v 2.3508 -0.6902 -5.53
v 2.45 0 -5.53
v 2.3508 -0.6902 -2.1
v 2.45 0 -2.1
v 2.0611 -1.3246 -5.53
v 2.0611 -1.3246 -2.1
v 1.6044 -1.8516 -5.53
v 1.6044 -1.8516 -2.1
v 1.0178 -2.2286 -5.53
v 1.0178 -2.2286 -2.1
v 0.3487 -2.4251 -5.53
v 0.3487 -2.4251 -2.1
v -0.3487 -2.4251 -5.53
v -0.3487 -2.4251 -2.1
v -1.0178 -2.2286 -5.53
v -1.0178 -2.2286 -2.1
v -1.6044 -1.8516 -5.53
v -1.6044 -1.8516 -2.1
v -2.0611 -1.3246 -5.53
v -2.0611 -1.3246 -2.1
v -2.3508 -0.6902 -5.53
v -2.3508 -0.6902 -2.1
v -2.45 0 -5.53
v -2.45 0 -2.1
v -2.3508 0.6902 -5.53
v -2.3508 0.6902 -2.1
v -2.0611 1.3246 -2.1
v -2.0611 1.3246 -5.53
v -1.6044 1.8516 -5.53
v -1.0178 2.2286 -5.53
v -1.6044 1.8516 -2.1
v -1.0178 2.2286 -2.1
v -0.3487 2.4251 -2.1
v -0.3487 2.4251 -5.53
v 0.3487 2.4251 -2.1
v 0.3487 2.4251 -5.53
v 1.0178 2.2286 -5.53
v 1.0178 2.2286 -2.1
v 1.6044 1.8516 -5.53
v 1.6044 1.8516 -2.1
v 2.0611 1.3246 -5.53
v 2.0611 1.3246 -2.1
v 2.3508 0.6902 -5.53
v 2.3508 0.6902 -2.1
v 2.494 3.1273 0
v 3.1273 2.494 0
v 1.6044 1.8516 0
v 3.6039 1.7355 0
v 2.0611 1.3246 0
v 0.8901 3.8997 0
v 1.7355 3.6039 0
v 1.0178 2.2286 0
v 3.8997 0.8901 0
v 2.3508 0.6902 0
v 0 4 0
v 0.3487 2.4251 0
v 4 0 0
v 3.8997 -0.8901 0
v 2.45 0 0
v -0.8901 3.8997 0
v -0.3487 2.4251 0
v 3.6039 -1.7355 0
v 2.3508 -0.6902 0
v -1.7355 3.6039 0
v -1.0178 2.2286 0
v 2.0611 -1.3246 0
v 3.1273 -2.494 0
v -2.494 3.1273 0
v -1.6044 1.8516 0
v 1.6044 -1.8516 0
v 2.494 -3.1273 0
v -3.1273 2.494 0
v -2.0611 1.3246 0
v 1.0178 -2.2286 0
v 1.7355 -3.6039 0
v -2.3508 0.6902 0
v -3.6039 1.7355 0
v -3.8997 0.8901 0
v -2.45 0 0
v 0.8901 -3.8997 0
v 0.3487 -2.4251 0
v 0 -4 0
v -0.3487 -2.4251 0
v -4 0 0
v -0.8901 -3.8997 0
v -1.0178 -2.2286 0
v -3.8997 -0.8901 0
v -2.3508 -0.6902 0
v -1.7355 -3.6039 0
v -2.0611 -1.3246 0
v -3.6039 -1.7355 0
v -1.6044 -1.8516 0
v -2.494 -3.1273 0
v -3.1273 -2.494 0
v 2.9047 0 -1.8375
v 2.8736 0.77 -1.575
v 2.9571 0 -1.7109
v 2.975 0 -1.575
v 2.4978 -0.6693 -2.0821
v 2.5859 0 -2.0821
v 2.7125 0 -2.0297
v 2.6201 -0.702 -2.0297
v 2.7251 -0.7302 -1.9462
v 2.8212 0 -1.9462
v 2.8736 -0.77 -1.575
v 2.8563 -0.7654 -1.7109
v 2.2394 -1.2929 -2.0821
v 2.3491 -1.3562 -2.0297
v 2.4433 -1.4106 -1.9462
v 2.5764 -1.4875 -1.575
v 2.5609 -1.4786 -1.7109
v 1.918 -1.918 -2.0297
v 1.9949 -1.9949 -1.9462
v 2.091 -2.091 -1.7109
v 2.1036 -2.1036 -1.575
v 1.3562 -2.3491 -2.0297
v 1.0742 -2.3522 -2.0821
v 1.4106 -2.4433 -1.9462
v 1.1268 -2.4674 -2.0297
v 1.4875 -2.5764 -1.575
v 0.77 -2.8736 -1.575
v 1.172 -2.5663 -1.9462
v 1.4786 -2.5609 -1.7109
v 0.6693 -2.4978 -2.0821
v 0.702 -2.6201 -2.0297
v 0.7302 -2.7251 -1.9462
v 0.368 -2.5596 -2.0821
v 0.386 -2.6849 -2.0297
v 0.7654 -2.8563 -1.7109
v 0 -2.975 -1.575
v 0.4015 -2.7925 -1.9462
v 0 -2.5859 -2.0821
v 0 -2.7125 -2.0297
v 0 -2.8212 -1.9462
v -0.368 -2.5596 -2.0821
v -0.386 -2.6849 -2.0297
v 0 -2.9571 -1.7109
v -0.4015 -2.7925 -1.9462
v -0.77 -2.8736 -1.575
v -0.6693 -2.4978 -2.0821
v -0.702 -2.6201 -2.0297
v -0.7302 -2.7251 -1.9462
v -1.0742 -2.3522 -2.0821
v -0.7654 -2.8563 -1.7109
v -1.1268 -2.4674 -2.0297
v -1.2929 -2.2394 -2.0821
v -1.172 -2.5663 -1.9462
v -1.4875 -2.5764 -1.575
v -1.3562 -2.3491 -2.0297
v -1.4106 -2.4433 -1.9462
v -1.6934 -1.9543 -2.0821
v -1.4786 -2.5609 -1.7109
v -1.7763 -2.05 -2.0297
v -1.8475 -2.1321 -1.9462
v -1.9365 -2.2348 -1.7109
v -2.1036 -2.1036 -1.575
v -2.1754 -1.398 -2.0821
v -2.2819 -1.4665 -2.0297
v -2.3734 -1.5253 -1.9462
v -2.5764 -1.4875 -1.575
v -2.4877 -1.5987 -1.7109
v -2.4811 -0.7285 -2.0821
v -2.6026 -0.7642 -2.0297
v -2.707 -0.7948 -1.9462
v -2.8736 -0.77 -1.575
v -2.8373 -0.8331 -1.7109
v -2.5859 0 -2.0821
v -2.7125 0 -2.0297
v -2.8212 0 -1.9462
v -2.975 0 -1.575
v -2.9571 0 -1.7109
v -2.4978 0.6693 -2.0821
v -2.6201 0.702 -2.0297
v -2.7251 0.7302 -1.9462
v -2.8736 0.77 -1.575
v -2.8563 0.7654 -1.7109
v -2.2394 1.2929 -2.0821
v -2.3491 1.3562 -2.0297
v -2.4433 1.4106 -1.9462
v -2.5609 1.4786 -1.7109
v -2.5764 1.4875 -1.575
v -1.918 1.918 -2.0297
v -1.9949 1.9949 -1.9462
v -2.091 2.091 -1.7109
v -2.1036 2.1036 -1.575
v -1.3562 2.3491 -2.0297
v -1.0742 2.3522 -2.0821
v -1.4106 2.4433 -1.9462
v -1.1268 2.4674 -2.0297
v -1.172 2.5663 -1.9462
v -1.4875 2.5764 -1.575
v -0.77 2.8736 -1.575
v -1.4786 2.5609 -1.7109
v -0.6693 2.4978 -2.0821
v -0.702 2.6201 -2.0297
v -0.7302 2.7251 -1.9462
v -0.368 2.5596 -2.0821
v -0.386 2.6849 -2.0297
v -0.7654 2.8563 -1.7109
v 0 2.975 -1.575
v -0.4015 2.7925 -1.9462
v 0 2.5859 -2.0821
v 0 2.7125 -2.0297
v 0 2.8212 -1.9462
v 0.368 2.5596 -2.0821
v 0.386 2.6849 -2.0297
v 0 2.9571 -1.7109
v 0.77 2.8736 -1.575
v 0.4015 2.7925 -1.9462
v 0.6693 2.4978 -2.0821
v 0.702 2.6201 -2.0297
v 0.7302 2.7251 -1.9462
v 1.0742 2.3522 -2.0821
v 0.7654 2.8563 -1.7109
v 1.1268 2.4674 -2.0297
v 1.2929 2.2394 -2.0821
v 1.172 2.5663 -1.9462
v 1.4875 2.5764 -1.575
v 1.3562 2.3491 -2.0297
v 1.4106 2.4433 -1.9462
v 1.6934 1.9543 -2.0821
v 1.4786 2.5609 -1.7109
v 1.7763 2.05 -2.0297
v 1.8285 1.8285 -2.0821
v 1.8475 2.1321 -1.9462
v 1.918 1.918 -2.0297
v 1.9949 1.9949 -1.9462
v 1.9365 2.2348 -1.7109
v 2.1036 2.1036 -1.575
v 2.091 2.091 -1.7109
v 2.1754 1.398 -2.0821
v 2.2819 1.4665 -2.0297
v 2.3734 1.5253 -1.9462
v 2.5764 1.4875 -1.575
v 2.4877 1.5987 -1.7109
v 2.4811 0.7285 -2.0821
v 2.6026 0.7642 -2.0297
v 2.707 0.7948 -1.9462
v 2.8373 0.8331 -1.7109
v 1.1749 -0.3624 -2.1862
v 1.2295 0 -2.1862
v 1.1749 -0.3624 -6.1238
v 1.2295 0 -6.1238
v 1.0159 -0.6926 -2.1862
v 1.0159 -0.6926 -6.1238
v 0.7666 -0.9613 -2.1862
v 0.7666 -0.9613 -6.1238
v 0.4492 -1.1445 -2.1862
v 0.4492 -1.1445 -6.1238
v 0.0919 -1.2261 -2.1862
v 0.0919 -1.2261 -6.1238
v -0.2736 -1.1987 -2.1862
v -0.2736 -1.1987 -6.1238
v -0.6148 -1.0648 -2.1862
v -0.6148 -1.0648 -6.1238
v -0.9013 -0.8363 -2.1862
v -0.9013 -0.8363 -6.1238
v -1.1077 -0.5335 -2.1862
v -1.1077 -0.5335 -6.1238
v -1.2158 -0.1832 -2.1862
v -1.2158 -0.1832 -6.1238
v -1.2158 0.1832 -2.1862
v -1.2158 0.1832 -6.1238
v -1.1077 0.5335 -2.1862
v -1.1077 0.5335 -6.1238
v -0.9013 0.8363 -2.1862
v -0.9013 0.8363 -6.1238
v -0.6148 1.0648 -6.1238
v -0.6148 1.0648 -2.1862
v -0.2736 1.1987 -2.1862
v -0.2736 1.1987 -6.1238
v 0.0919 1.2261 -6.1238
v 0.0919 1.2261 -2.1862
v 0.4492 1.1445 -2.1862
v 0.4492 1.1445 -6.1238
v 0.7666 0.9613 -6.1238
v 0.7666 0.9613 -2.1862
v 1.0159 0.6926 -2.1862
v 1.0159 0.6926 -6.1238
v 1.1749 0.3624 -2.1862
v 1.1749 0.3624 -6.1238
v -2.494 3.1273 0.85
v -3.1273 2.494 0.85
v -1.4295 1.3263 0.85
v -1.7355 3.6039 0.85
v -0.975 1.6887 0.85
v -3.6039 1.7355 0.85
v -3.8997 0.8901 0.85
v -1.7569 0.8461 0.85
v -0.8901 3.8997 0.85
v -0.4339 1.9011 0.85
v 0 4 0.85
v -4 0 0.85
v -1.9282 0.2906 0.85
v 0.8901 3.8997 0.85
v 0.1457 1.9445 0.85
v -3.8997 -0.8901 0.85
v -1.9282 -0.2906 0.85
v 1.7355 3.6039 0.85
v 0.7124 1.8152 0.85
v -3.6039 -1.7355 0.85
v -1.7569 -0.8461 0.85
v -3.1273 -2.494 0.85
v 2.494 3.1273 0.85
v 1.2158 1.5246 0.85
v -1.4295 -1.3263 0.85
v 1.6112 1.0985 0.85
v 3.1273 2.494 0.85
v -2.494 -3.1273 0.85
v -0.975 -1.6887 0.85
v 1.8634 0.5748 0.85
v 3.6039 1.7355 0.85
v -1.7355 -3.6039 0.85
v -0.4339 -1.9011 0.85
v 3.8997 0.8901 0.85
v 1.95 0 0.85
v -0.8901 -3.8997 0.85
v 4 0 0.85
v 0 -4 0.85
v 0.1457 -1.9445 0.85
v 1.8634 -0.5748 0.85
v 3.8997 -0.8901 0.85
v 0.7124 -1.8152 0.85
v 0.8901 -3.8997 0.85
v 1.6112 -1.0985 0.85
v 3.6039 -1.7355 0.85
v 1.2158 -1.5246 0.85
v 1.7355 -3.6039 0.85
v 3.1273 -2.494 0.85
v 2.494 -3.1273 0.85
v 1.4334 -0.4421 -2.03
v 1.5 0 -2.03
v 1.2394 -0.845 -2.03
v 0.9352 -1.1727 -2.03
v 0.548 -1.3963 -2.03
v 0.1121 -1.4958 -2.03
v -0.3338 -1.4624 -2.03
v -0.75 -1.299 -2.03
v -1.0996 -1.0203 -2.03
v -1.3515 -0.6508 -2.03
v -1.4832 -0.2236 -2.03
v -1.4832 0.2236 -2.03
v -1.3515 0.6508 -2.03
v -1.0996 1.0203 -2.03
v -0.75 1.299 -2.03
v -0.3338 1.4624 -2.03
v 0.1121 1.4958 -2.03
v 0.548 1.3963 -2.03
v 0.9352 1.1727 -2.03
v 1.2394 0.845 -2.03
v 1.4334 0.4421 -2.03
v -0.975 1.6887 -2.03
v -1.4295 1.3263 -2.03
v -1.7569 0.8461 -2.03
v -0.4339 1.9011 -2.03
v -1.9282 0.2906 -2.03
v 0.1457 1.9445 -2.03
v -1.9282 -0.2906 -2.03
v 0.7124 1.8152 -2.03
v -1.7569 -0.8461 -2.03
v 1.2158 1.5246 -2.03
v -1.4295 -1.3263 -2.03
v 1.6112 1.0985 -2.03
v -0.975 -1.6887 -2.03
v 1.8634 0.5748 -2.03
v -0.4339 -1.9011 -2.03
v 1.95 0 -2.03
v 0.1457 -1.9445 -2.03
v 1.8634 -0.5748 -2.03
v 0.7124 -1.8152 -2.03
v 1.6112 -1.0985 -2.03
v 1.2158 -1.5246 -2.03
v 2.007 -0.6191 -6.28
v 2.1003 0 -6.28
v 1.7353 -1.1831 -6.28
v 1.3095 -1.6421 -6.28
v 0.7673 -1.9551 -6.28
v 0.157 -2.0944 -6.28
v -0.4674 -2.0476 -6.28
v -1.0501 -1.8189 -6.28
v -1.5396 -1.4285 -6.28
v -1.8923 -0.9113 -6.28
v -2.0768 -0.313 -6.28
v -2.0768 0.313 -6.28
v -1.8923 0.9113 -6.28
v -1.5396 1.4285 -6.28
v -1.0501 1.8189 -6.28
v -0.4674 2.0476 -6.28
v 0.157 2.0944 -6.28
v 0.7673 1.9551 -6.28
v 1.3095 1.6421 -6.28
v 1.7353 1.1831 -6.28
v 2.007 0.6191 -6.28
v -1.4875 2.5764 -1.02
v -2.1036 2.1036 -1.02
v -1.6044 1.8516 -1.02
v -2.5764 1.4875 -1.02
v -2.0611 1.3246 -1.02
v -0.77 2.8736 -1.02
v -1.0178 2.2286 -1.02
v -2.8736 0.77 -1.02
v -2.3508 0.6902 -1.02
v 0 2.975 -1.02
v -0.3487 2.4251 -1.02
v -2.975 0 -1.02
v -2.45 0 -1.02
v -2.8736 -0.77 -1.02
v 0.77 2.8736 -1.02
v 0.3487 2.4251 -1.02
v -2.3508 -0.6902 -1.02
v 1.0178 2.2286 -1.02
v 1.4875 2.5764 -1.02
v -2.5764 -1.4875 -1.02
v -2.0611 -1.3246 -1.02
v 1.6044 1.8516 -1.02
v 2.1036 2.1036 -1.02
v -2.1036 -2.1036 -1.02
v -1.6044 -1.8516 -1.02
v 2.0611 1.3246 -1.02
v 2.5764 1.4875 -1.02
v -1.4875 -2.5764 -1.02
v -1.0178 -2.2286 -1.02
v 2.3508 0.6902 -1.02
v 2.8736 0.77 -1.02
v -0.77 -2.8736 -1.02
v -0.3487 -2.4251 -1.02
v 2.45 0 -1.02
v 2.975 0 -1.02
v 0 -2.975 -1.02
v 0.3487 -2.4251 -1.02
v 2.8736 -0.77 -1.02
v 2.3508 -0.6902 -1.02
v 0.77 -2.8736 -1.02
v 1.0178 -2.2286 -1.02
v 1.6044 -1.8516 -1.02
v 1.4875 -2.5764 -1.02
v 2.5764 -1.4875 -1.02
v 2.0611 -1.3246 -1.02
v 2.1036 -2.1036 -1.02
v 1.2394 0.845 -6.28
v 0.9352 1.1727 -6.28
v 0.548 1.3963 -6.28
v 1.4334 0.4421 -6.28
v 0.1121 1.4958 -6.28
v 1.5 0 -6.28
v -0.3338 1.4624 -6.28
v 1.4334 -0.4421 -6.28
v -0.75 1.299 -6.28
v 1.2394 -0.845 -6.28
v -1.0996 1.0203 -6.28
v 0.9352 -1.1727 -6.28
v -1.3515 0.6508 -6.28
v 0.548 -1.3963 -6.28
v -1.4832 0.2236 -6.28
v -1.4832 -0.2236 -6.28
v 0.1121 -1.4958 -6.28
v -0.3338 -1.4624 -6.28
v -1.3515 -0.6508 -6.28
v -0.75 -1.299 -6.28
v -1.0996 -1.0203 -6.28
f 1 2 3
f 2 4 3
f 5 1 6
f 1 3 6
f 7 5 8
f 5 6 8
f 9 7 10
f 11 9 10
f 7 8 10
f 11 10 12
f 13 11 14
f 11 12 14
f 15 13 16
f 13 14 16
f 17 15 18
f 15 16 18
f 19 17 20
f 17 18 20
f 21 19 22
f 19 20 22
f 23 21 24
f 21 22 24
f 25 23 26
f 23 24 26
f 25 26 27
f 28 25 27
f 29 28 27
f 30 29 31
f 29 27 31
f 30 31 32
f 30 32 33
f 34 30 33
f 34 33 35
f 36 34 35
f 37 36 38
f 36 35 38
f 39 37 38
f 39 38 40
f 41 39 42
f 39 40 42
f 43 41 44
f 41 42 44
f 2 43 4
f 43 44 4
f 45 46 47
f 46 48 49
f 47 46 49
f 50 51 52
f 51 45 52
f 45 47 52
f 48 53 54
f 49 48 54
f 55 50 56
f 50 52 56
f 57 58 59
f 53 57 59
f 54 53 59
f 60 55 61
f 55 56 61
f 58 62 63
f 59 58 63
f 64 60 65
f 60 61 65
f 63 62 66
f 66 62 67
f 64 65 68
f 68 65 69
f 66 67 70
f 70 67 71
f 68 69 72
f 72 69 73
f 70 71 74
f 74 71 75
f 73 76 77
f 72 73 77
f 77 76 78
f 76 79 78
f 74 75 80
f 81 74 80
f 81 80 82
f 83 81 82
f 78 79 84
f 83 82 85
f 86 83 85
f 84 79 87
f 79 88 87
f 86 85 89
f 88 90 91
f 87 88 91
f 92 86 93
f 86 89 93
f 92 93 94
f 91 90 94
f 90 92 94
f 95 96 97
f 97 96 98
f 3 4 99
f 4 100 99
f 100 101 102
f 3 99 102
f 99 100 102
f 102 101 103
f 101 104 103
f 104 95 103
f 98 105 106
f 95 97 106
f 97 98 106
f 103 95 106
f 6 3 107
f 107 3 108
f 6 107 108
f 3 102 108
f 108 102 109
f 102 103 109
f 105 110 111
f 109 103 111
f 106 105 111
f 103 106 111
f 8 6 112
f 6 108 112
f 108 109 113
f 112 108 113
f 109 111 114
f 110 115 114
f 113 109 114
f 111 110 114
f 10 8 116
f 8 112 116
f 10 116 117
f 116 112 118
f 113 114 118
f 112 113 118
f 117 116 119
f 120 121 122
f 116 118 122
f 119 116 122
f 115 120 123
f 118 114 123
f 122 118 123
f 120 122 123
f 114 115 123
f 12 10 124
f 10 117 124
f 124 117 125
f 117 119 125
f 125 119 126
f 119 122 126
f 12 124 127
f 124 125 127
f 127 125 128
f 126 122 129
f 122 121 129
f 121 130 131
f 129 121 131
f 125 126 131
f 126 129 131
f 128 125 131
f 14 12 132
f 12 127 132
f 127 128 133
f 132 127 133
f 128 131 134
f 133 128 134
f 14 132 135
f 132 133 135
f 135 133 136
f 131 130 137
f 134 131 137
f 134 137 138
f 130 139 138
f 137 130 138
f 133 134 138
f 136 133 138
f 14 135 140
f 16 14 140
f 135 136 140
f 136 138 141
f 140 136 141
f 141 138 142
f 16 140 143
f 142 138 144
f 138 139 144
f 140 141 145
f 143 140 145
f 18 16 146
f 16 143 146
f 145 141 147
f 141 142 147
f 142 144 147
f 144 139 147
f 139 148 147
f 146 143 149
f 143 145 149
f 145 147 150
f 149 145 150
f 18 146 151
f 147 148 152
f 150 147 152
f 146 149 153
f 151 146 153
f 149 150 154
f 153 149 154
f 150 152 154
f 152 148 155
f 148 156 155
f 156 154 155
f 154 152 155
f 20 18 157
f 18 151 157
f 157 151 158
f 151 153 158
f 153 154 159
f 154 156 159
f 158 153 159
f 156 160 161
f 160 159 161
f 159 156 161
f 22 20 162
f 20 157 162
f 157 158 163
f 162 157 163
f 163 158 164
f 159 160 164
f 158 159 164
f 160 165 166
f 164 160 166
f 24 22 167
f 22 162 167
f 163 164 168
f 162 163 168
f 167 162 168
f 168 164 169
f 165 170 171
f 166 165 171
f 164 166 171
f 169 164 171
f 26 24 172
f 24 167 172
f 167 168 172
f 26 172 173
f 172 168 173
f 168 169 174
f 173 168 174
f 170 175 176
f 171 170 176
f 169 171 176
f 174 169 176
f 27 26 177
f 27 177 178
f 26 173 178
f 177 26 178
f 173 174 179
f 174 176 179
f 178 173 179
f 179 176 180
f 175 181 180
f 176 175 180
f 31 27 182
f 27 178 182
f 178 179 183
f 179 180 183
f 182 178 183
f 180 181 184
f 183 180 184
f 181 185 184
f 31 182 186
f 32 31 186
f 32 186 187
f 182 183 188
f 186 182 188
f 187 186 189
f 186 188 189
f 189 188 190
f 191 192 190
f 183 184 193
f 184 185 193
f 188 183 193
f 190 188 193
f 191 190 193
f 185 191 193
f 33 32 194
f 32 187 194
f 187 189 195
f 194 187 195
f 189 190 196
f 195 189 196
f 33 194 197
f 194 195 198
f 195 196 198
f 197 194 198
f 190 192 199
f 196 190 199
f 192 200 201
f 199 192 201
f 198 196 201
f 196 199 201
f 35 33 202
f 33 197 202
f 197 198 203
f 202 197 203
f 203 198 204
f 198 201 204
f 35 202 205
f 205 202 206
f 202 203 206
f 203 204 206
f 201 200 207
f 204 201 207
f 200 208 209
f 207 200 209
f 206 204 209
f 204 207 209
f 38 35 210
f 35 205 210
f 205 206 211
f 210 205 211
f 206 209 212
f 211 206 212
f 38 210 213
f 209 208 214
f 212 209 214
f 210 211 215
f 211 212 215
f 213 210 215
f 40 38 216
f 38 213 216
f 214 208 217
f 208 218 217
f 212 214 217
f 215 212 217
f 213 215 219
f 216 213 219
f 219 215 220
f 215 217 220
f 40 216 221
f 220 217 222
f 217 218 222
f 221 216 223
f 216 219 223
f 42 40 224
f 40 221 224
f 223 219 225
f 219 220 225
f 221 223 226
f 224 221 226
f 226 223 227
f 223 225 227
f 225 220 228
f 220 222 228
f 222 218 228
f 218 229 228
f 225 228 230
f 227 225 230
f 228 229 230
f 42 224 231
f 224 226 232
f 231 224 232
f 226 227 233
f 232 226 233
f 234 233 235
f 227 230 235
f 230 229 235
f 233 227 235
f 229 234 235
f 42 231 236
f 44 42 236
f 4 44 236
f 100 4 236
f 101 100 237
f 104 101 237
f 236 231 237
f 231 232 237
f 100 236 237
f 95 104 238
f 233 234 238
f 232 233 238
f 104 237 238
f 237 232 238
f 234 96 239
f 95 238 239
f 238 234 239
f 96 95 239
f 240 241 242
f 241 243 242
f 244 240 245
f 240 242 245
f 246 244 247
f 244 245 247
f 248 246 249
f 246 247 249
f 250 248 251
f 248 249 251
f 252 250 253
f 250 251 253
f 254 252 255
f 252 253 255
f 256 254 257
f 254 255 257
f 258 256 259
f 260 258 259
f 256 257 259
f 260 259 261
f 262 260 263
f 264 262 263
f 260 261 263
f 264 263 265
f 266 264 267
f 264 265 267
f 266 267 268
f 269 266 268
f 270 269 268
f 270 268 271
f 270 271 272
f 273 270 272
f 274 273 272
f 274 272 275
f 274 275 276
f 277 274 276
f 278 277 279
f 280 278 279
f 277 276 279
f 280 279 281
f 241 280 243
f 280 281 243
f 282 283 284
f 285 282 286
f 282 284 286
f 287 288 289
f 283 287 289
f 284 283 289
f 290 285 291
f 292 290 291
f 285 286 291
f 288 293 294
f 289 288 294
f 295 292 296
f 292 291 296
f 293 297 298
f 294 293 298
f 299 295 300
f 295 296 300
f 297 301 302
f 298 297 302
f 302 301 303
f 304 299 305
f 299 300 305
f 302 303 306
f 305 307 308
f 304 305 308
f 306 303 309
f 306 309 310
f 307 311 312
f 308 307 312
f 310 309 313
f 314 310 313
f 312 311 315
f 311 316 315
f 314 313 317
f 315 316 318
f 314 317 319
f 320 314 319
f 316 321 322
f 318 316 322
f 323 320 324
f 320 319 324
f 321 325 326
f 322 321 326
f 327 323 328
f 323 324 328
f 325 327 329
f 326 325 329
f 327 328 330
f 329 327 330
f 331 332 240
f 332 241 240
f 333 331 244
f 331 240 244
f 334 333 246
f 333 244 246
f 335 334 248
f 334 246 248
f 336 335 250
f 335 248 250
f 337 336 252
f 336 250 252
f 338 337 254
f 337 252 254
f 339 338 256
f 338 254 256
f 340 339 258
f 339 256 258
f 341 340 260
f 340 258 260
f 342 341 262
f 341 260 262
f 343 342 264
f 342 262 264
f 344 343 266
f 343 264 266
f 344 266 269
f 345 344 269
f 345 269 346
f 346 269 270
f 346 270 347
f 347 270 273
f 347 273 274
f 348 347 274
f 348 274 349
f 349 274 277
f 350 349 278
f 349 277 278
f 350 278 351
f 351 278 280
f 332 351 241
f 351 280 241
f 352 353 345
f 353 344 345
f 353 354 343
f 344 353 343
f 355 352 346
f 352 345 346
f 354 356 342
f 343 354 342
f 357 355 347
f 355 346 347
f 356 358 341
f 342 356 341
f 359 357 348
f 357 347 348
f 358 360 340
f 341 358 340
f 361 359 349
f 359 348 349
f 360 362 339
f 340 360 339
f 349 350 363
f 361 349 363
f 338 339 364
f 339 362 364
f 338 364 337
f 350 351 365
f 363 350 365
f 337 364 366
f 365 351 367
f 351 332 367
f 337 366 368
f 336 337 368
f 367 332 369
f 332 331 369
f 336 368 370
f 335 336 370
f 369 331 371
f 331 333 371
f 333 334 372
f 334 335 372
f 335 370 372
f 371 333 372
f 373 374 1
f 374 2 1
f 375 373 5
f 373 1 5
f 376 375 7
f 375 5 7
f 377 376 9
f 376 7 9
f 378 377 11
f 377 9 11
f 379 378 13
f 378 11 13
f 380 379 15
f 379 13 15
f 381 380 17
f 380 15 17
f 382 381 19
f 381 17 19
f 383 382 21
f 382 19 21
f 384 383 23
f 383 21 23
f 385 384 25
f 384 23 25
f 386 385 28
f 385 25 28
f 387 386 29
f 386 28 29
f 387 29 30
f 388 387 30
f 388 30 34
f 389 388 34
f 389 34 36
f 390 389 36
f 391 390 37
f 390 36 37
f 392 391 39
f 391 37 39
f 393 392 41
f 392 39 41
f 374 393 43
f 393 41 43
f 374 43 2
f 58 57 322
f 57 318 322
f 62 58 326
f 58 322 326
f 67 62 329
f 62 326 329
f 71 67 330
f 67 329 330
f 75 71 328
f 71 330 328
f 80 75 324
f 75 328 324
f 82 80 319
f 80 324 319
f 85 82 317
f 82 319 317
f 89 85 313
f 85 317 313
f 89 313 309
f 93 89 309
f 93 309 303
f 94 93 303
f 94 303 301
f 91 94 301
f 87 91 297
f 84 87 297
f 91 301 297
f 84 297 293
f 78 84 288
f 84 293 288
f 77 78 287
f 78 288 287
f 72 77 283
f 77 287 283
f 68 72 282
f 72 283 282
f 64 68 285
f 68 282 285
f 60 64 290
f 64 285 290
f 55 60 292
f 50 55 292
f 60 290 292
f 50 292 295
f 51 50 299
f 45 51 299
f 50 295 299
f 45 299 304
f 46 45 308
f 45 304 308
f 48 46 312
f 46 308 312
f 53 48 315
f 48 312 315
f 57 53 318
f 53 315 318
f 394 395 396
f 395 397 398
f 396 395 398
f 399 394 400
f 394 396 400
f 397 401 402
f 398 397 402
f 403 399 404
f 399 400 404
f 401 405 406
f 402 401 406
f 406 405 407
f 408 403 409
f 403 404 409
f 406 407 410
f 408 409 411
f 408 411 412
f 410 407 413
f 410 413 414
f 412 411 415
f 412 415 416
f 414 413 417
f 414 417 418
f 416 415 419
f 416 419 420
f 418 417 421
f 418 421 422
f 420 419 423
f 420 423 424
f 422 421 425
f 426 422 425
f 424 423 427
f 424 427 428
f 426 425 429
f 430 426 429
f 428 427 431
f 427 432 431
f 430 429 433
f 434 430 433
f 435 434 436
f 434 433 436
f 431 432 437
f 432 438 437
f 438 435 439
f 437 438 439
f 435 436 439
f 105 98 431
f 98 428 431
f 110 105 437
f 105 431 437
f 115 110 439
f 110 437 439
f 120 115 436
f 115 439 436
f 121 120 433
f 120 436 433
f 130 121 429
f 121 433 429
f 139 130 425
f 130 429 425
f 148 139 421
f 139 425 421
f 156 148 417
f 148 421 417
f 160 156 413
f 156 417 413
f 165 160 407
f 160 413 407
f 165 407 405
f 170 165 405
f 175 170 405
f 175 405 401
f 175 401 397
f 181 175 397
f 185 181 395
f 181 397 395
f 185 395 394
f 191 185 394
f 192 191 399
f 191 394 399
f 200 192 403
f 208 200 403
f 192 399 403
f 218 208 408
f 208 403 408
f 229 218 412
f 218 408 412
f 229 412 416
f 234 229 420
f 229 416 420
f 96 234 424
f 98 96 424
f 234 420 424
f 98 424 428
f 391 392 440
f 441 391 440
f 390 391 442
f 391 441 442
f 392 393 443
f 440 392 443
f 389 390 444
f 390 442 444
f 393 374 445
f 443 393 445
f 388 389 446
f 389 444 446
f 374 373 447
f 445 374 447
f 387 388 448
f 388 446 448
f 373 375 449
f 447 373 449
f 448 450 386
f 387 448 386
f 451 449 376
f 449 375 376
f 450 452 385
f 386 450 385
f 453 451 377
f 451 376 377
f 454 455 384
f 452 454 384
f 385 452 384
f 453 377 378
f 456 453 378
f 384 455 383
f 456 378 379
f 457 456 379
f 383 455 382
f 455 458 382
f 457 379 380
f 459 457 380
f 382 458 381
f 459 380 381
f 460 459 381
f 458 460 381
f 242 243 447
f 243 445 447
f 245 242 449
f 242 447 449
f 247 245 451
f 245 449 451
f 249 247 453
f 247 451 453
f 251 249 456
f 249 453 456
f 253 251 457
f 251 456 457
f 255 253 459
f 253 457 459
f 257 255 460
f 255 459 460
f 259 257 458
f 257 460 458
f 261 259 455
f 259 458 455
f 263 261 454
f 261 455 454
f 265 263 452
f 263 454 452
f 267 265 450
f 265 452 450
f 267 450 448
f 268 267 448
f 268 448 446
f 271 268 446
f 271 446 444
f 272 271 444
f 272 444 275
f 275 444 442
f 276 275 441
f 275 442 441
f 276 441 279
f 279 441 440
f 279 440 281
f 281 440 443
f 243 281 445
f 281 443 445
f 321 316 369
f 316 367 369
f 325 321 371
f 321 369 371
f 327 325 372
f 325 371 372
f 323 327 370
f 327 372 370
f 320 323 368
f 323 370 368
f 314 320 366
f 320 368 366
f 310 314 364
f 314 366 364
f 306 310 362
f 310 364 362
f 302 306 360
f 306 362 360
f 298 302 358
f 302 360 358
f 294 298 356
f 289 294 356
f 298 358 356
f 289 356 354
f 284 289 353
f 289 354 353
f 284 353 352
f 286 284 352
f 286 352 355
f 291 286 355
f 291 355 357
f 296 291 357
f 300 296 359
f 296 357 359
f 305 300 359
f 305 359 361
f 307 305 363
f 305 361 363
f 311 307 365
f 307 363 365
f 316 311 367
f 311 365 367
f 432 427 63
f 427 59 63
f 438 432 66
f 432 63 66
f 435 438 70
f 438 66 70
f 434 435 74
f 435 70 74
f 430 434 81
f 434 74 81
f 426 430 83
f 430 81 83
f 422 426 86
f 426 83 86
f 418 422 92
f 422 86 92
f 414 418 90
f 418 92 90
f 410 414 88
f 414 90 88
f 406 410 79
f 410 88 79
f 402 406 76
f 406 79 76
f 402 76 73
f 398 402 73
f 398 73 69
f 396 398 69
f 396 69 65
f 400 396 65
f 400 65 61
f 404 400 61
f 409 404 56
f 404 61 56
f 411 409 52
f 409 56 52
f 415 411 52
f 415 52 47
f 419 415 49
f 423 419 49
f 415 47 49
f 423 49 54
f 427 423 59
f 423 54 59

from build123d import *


with BuildPart() as part:
    # Sketch1 → Revolve1 (revolve)
    with BuildSketch(Plane(origin=(0, 0, 0), x_dir=(0, 0, -1), z_dir=(1, 0, 0)), mode=Mode.PRIVATE) as revolve1_sk:
        with BuildLine():
            Line((-0.85, 1.95), (2.03, 1.95))
            Line((2.03, 1.95), (2.03, 1.5))
            Line((2.03, 1.5), (2.186173248, 1.2295))
            Line((2.186173248, 1.2295), (6.123826752, 1.2295))
            Line((6.123826752, 1.2295), (6.28, 1.5))
            Line((6.28, 1.5), (6.28, 2.100269256))
            Line((6.28, 2.100269256), (5.53, 2.45))
            Line((5.53, 2.45), (2.1, 2.45))
            ThreePointArc((2.1, 2.45), (1.94623106, 2.82123106), (1.575, 2.975))
            Line((1.575, 2.975), (1.02, 2.975))
            Line((1.02, 2.975), (1.02, 2.45))
            Line((1.02, 2.45), (0, 2.45))
            Line((0, 2.45), (0, 4))
            Line((0, 4), (-0.85, 4))
            Line((-0.85, 4), (-0.85, 1.95))
        make_face()
    revolve(revolve1_sk.sketch.rotate(Axis((0, 0, 0), (0, 0, -1)), 90), axis=Axis((0, 0, 0), (0, 0, -1)))


solid = part.part
